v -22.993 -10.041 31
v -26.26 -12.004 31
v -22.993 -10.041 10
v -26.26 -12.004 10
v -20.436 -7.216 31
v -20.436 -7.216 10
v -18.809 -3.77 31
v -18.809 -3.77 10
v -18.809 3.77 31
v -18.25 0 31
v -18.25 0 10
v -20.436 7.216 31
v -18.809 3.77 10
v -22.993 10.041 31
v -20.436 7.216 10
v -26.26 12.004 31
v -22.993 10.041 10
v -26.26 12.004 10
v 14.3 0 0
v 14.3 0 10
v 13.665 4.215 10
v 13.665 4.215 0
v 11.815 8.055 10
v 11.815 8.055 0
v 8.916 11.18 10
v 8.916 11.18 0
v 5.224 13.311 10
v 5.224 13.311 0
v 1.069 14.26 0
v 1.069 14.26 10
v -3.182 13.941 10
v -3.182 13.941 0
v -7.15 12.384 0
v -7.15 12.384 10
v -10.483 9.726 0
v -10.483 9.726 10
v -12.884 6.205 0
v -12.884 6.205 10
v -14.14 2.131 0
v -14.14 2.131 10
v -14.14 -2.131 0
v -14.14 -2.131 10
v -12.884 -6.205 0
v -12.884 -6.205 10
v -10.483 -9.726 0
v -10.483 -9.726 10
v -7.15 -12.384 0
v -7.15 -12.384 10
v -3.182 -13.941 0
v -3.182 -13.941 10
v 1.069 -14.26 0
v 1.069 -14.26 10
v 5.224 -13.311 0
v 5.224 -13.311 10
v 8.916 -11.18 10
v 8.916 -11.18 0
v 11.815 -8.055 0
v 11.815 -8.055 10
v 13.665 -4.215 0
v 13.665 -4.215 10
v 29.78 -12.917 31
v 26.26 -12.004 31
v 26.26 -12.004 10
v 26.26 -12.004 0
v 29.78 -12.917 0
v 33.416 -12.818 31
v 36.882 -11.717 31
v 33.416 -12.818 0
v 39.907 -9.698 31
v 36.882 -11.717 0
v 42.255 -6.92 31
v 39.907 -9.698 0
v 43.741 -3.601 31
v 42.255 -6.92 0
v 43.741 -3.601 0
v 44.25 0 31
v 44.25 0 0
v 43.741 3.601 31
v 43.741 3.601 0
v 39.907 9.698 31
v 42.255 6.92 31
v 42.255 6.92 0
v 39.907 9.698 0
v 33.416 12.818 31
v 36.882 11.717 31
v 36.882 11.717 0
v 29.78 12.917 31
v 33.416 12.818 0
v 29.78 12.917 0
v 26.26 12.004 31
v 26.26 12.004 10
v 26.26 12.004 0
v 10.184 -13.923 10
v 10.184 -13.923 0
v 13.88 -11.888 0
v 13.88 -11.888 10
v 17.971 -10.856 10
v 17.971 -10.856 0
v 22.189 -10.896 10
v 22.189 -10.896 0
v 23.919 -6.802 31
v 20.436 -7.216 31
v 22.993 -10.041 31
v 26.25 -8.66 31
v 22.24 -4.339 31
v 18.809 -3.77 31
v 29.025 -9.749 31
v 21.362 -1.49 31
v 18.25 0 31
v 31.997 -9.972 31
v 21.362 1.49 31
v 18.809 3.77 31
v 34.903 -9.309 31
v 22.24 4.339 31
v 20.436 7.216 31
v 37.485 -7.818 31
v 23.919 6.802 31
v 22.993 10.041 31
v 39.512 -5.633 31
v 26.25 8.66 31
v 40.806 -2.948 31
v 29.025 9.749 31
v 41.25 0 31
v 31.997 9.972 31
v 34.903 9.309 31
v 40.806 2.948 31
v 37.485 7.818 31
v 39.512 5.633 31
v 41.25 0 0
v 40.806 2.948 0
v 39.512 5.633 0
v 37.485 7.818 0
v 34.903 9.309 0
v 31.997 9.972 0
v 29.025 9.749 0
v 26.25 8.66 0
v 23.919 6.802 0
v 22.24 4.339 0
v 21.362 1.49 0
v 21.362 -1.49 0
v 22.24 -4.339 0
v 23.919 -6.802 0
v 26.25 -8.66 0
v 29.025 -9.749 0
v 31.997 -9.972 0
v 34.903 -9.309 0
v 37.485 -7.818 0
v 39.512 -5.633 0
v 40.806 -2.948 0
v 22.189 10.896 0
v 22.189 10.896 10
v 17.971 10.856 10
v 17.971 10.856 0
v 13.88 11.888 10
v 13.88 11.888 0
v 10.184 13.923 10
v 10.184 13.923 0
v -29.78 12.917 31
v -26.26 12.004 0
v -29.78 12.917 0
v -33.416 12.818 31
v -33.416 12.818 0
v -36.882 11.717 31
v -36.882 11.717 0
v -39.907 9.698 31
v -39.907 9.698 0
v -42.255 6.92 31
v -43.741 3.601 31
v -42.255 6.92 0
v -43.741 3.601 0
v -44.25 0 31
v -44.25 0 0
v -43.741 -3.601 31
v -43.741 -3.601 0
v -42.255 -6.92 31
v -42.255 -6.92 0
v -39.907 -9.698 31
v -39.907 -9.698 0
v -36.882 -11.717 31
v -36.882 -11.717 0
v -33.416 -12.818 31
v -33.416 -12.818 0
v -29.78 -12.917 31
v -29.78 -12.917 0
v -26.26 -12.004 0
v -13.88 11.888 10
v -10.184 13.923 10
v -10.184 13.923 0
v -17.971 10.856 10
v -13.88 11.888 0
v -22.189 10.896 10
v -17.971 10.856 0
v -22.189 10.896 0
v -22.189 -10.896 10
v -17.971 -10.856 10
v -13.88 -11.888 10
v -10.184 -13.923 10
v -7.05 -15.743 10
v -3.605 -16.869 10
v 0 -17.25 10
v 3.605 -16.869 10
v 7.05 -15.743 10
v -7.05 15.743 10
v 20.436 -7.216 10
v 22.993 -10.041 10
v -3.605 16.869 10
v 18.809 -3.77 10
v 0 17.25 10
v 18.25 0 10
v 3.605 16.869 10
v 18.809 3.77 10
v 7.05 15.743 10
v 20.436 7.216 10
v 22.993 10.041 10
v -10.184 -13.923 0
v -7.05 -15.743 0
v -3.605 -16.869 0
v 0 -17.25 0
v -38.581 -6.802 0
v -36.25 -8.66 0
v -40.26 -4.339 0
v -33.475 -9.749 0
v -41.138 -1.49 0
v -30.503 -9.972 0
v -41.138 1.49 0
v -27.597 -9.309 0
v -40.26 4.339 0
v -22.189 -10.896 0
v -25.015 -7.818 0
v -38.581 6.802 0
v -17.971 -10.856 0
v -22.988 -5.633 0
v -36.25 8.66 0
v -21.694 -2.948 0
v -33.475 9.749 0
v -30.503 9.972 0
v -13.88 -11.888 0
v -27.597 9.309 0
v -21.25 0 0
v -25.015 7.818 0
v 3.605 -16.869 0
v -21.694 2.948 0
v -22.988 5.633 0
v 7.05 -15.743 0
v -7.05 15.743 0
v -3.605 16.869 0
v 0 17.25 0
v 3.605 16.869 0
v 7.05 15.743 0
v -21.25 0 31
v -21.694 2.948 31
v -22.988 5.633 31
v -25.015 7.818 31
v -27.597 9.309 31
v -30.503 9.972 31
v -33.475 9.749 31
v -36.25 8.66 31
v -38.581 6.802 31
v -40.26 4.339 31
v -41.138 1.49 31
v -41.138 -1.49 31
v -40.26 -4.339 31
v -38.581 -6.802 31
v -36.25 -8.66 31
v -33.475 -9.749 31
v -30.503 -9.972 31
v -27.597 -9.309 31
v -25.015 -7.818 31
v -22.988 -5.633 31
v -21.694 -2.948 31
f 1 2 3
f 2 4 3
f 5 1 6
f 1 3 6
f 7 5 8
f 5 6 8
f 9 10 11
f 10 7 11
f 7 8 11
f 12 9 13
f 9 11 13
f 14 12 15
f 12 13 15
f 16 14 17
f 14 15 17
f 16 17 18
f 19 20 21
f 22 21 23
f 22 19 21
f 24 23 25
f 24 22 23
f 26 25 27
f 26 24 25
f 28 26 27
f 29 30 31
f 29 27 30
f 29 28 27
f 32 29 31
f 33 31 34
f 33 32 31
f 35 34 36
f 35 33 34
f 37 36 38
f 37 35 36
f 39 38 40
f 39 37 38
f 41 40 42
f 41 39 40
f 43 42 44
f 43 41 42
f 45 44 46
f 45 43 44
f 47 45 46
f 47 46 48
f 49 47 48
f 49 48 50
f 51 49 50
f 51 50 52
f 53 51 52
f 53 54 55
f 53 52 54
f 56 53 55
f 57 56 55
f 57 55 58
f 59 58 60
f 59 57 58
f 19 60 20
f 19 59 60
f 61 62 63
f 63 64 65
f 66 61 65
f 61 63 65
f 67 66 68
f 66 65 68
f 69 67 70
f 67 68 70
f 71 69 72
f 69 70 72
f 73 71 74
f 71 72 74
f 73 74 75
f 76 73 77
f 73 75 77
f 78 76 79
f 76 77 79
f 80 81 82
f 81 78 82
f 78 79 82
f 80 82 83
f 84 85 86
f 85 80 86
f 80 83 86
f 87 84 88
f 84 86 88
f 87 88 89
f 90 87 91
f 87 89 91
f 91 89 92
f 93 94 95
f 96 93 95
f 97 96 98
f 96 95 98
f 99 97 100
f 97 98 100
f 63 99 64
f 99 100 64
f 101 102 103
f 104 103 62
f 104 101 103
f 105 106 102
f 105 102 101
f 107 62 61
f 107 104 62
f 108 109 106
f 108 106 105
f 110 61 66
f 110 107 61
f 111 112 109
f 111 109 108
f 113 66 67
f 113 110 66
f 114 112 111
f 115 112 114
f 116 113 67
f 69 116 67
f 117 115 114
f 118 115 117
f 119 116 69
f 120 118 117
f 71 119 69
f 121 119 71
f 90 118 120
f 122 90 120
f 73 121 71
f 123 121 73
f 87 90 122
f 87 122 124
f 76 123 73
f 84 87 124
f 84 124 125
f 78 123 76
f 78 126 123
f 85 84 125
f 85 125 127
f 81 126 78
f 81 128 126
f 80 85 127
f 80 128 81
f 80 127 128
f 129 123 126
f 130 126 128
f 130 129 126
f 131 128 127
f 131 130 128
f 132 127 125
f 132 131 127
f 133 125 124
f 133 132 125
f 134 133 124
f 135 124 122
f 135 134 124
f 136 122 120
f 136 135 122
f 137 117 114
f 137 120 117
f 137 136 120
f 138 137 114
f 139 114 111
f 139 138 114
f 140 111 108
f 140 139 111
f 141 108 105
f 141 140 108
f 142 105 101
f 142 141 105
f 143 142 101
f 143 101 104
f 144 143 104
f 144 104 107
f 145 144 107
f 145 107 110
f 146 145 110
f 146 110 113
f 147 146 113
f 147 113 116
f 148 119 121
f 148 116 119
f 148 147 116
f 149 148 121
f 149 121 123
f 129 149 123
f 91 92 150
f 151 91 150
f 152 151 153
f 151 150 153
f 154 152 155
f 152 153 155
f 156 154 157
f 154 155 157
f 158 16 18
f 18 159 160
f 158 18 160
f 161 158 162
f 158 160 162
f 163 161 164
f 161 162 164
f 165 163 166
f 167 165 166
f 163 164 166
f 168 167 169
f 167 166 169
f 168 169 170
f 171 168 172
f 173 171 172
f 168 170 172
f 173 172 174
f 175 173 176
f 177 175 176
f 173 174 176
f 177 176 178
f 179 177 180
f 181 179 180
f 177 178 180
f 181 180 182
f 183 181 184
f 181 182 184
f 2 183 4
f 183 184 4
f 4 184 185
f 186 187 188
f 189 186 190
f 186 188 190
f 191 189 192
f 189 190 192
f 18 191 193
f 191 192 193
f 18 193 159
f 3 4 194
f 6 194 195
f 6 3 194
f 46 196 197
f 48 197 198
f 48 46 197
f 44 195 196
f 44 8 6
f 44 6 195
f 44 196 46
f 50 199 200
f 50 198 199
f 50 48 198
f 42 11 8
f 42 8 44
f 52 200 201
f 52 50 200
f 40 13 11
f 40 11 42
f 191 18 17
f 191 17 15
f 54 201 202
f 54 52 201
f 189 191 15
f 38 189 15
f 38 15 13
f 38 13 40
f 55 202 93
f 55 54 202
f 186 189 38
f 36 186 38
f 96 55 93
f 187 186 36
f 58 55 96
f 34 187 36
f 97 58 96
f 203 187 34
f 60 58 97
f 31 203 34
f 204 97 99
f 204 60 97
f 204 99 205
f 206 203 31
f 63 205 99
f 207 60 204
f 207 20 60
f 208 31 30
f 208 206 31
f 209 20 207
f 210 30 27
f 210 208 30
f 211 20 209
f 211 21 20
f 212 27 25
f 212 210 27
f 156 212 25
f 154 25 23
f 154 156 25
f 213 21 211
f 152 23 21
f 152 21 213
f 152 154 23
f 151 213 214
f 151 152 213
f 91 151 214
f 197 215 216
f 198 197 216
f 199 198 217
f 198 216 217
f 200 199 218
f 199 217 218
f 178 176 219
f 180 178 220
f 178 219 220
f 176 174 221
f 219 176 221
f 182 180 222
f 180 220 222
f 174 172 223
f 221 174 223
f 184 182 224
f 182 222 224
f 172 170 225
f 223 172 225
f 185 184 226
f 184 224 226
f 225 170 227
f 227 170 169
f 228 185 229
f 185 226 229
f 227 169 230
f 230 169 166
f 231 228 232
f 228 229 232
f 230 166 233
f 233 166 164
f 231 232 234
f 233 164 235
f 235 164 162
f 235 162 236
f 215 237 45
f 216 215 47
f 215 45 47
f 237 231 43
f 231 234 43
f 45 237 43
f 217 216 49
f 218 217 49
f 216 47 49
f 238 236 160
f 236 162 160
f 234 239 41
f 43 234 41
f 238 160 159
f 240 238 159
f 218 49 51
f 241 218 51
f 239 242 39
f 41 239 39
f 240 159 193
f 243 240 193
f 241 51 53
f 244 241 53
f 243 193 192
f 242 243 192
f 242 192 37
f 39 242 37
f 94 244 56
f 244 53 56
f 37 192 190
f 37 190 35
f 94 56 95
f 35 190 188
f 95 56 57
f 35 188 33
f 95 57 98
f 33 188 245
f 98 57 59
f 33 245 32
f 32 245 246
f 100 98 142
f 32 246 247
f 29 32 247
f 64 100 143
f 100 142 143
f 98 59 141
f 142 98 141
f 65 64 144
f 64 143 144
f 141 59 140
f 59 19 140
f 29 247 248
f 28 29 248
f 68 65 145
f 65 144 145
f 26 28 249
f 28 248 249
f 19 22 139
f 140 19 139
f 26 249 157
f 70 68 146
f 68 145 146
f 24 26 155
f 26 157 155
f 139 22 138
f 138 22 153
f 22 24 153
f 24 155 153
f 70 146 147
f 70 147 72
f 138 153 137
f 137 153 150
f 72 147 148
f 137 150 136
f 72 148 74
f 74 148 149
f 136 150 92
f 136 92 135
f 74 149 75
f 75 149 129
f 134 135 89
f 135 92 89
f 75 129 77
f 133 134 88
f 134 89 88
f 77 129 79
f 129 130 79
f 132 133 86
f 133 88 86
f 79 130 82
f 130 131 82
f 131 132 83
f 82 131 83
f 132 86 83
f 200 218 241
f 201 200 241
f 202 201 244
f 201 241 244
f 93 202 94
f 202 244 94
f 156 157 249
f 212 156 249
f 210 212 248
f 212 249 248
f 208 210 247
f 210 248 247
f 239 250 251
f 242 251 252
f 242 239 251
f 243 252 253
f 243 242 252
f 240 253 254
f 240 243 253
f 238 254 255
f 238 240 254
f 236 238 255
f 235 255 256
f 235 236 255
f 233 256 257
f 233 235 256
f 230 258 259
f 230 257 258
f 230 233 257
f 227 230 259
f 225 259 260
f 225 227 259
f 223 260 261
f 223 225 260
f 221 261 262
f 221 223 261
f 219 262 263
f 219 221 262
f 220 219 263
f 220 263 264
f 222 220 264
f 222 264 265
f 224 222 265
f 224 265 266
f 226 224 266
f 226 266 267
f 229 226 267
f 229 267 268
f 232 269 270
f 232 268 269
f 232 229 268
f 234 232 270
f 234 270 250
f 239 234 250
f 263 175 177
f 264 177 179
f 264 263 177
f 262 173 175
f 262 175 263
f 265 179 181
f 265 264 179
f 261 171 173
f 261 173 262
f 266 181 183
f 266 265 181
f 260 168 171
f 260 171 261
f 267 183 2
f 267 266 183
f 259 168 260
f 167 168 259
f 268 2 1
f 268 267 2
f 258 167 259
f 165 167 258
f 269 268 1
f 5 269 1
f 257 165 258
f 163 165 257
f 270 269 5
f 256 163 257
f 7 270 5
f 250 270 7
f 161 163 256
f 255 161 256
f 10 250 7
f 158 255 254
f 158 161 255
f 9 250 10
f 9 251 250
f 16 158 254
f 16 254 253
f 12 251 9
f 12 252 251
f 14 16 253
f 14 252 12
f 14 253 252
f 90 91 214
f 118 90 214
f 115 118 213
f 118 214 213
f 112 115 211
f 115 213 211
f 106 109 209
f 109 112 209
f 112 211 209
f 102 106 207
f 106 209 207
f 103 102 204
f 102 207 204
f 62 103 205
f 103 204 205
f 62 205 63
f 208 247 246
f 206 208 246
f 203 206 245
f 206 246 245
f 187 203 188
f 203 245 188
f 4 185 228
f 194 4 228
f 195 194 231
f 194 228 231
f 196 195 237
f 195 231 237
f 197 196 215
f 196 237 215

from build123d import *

# Parameters (mm, degrees)
F1_DEPTH = 31
F2_R     = 14.3
F2_R_2   = 10
F3_DEPTH = 31.001
F4_W     = 33
F4_H     = 80
F5_DEPTH = 21
F7_START = 10
F6_R     = 22.5
F6_R_2   = 13
F7_DEPTH = 21.001


with BuildPart() as f1:
    # F0 (on Top) → F1 (new body)
    with BuildSketch(Plane.XY):
        with BuildLine():
            ThreePointArc((-10.1844, 13.9226612628), (-17.9705989063, 10.8562655965), (-26.2597627119, 12.0040631375))
            ThreePointArc((-26.2597627119, 12.0040631375), (-44.25, 0), (-26.2597627119, -12.0040631375))
            ThreePointArc((-26.2597627119, -12.0040631375), (-17.9705989063, -10.8562655965), (-10.1844, -13.9226612628))
            ThreePointArc((-10.1844, -13.9226612628), (-5.3570791116, -16.3970791116), (0, -17.25))
            ThreePointArc((0, -17.25), (5.3570791116, -16.3970791116), (10.1844, -13.9226612628))
            ThreePointArc((10.1844, -13.9226612628), (17.9705989063, -10.8562655965), (26.2597627119, -12.0040631375))
            ThreePointArc((26.2597627119, -12.0040631375), (44.25, 0), (26.2597627119, 12.0040631375))
            ThreePointArc((26.2597627119, 12.0040631375), (17.9705989063, 10.8562655965), (10.1844, 13.9226612628))
            ThreePointArc((10.1844, 13.9226612628), (5.3570791116, 16.3970791116), (0, 17.25))
            ThreePointArc((0, 17.25), (-5.3570791116, 16.3970791116), (-10.1844, 13.9226612628))
        make_face()
    extrude(amount=F1_DEPTH)

    # F2 (on Top) → F3 (cut, through all)
    with BuildSketch(Plane.XY):
        Circle(F2_R)
        with Locations((-31.25, 0)):
            Circle(F2_R_2)
        with Locations((31.25, 0)):
            Circle(F2_R_2)
    extrude(amount=F3_DEPTH, mode=Mode.SUBTRACT)

    # F4 (on face) → F5 (cut)
    with BuildSketch(Plane.XY.offset(31)):
        Rectangle(F4_W, F4_H)
    extrude(amount=-F5_DEPTH, mode=Mode.SUBTRACT)

    # F6 (on Top) → F7 (cut)
    with BuildSketch(Plane.XY.offset(F7_START)):
        with Locations((-31.25, 0)):
            Circle(F6_R)
        with Locations((-31.25, 0)):
            Circle(F6_R_2, mode=Mode.SUBTRACT)
        with Locations((31.25, 0)):
            Circle(F6_R)
        with Locations((31.25, 0)):
            Circle(F6_R_2, mode=Mode.SUBTRACT)
    extrude(amount=F7_DEPTH, mode=Mode.SUBTRACT)


solid = f1.part
